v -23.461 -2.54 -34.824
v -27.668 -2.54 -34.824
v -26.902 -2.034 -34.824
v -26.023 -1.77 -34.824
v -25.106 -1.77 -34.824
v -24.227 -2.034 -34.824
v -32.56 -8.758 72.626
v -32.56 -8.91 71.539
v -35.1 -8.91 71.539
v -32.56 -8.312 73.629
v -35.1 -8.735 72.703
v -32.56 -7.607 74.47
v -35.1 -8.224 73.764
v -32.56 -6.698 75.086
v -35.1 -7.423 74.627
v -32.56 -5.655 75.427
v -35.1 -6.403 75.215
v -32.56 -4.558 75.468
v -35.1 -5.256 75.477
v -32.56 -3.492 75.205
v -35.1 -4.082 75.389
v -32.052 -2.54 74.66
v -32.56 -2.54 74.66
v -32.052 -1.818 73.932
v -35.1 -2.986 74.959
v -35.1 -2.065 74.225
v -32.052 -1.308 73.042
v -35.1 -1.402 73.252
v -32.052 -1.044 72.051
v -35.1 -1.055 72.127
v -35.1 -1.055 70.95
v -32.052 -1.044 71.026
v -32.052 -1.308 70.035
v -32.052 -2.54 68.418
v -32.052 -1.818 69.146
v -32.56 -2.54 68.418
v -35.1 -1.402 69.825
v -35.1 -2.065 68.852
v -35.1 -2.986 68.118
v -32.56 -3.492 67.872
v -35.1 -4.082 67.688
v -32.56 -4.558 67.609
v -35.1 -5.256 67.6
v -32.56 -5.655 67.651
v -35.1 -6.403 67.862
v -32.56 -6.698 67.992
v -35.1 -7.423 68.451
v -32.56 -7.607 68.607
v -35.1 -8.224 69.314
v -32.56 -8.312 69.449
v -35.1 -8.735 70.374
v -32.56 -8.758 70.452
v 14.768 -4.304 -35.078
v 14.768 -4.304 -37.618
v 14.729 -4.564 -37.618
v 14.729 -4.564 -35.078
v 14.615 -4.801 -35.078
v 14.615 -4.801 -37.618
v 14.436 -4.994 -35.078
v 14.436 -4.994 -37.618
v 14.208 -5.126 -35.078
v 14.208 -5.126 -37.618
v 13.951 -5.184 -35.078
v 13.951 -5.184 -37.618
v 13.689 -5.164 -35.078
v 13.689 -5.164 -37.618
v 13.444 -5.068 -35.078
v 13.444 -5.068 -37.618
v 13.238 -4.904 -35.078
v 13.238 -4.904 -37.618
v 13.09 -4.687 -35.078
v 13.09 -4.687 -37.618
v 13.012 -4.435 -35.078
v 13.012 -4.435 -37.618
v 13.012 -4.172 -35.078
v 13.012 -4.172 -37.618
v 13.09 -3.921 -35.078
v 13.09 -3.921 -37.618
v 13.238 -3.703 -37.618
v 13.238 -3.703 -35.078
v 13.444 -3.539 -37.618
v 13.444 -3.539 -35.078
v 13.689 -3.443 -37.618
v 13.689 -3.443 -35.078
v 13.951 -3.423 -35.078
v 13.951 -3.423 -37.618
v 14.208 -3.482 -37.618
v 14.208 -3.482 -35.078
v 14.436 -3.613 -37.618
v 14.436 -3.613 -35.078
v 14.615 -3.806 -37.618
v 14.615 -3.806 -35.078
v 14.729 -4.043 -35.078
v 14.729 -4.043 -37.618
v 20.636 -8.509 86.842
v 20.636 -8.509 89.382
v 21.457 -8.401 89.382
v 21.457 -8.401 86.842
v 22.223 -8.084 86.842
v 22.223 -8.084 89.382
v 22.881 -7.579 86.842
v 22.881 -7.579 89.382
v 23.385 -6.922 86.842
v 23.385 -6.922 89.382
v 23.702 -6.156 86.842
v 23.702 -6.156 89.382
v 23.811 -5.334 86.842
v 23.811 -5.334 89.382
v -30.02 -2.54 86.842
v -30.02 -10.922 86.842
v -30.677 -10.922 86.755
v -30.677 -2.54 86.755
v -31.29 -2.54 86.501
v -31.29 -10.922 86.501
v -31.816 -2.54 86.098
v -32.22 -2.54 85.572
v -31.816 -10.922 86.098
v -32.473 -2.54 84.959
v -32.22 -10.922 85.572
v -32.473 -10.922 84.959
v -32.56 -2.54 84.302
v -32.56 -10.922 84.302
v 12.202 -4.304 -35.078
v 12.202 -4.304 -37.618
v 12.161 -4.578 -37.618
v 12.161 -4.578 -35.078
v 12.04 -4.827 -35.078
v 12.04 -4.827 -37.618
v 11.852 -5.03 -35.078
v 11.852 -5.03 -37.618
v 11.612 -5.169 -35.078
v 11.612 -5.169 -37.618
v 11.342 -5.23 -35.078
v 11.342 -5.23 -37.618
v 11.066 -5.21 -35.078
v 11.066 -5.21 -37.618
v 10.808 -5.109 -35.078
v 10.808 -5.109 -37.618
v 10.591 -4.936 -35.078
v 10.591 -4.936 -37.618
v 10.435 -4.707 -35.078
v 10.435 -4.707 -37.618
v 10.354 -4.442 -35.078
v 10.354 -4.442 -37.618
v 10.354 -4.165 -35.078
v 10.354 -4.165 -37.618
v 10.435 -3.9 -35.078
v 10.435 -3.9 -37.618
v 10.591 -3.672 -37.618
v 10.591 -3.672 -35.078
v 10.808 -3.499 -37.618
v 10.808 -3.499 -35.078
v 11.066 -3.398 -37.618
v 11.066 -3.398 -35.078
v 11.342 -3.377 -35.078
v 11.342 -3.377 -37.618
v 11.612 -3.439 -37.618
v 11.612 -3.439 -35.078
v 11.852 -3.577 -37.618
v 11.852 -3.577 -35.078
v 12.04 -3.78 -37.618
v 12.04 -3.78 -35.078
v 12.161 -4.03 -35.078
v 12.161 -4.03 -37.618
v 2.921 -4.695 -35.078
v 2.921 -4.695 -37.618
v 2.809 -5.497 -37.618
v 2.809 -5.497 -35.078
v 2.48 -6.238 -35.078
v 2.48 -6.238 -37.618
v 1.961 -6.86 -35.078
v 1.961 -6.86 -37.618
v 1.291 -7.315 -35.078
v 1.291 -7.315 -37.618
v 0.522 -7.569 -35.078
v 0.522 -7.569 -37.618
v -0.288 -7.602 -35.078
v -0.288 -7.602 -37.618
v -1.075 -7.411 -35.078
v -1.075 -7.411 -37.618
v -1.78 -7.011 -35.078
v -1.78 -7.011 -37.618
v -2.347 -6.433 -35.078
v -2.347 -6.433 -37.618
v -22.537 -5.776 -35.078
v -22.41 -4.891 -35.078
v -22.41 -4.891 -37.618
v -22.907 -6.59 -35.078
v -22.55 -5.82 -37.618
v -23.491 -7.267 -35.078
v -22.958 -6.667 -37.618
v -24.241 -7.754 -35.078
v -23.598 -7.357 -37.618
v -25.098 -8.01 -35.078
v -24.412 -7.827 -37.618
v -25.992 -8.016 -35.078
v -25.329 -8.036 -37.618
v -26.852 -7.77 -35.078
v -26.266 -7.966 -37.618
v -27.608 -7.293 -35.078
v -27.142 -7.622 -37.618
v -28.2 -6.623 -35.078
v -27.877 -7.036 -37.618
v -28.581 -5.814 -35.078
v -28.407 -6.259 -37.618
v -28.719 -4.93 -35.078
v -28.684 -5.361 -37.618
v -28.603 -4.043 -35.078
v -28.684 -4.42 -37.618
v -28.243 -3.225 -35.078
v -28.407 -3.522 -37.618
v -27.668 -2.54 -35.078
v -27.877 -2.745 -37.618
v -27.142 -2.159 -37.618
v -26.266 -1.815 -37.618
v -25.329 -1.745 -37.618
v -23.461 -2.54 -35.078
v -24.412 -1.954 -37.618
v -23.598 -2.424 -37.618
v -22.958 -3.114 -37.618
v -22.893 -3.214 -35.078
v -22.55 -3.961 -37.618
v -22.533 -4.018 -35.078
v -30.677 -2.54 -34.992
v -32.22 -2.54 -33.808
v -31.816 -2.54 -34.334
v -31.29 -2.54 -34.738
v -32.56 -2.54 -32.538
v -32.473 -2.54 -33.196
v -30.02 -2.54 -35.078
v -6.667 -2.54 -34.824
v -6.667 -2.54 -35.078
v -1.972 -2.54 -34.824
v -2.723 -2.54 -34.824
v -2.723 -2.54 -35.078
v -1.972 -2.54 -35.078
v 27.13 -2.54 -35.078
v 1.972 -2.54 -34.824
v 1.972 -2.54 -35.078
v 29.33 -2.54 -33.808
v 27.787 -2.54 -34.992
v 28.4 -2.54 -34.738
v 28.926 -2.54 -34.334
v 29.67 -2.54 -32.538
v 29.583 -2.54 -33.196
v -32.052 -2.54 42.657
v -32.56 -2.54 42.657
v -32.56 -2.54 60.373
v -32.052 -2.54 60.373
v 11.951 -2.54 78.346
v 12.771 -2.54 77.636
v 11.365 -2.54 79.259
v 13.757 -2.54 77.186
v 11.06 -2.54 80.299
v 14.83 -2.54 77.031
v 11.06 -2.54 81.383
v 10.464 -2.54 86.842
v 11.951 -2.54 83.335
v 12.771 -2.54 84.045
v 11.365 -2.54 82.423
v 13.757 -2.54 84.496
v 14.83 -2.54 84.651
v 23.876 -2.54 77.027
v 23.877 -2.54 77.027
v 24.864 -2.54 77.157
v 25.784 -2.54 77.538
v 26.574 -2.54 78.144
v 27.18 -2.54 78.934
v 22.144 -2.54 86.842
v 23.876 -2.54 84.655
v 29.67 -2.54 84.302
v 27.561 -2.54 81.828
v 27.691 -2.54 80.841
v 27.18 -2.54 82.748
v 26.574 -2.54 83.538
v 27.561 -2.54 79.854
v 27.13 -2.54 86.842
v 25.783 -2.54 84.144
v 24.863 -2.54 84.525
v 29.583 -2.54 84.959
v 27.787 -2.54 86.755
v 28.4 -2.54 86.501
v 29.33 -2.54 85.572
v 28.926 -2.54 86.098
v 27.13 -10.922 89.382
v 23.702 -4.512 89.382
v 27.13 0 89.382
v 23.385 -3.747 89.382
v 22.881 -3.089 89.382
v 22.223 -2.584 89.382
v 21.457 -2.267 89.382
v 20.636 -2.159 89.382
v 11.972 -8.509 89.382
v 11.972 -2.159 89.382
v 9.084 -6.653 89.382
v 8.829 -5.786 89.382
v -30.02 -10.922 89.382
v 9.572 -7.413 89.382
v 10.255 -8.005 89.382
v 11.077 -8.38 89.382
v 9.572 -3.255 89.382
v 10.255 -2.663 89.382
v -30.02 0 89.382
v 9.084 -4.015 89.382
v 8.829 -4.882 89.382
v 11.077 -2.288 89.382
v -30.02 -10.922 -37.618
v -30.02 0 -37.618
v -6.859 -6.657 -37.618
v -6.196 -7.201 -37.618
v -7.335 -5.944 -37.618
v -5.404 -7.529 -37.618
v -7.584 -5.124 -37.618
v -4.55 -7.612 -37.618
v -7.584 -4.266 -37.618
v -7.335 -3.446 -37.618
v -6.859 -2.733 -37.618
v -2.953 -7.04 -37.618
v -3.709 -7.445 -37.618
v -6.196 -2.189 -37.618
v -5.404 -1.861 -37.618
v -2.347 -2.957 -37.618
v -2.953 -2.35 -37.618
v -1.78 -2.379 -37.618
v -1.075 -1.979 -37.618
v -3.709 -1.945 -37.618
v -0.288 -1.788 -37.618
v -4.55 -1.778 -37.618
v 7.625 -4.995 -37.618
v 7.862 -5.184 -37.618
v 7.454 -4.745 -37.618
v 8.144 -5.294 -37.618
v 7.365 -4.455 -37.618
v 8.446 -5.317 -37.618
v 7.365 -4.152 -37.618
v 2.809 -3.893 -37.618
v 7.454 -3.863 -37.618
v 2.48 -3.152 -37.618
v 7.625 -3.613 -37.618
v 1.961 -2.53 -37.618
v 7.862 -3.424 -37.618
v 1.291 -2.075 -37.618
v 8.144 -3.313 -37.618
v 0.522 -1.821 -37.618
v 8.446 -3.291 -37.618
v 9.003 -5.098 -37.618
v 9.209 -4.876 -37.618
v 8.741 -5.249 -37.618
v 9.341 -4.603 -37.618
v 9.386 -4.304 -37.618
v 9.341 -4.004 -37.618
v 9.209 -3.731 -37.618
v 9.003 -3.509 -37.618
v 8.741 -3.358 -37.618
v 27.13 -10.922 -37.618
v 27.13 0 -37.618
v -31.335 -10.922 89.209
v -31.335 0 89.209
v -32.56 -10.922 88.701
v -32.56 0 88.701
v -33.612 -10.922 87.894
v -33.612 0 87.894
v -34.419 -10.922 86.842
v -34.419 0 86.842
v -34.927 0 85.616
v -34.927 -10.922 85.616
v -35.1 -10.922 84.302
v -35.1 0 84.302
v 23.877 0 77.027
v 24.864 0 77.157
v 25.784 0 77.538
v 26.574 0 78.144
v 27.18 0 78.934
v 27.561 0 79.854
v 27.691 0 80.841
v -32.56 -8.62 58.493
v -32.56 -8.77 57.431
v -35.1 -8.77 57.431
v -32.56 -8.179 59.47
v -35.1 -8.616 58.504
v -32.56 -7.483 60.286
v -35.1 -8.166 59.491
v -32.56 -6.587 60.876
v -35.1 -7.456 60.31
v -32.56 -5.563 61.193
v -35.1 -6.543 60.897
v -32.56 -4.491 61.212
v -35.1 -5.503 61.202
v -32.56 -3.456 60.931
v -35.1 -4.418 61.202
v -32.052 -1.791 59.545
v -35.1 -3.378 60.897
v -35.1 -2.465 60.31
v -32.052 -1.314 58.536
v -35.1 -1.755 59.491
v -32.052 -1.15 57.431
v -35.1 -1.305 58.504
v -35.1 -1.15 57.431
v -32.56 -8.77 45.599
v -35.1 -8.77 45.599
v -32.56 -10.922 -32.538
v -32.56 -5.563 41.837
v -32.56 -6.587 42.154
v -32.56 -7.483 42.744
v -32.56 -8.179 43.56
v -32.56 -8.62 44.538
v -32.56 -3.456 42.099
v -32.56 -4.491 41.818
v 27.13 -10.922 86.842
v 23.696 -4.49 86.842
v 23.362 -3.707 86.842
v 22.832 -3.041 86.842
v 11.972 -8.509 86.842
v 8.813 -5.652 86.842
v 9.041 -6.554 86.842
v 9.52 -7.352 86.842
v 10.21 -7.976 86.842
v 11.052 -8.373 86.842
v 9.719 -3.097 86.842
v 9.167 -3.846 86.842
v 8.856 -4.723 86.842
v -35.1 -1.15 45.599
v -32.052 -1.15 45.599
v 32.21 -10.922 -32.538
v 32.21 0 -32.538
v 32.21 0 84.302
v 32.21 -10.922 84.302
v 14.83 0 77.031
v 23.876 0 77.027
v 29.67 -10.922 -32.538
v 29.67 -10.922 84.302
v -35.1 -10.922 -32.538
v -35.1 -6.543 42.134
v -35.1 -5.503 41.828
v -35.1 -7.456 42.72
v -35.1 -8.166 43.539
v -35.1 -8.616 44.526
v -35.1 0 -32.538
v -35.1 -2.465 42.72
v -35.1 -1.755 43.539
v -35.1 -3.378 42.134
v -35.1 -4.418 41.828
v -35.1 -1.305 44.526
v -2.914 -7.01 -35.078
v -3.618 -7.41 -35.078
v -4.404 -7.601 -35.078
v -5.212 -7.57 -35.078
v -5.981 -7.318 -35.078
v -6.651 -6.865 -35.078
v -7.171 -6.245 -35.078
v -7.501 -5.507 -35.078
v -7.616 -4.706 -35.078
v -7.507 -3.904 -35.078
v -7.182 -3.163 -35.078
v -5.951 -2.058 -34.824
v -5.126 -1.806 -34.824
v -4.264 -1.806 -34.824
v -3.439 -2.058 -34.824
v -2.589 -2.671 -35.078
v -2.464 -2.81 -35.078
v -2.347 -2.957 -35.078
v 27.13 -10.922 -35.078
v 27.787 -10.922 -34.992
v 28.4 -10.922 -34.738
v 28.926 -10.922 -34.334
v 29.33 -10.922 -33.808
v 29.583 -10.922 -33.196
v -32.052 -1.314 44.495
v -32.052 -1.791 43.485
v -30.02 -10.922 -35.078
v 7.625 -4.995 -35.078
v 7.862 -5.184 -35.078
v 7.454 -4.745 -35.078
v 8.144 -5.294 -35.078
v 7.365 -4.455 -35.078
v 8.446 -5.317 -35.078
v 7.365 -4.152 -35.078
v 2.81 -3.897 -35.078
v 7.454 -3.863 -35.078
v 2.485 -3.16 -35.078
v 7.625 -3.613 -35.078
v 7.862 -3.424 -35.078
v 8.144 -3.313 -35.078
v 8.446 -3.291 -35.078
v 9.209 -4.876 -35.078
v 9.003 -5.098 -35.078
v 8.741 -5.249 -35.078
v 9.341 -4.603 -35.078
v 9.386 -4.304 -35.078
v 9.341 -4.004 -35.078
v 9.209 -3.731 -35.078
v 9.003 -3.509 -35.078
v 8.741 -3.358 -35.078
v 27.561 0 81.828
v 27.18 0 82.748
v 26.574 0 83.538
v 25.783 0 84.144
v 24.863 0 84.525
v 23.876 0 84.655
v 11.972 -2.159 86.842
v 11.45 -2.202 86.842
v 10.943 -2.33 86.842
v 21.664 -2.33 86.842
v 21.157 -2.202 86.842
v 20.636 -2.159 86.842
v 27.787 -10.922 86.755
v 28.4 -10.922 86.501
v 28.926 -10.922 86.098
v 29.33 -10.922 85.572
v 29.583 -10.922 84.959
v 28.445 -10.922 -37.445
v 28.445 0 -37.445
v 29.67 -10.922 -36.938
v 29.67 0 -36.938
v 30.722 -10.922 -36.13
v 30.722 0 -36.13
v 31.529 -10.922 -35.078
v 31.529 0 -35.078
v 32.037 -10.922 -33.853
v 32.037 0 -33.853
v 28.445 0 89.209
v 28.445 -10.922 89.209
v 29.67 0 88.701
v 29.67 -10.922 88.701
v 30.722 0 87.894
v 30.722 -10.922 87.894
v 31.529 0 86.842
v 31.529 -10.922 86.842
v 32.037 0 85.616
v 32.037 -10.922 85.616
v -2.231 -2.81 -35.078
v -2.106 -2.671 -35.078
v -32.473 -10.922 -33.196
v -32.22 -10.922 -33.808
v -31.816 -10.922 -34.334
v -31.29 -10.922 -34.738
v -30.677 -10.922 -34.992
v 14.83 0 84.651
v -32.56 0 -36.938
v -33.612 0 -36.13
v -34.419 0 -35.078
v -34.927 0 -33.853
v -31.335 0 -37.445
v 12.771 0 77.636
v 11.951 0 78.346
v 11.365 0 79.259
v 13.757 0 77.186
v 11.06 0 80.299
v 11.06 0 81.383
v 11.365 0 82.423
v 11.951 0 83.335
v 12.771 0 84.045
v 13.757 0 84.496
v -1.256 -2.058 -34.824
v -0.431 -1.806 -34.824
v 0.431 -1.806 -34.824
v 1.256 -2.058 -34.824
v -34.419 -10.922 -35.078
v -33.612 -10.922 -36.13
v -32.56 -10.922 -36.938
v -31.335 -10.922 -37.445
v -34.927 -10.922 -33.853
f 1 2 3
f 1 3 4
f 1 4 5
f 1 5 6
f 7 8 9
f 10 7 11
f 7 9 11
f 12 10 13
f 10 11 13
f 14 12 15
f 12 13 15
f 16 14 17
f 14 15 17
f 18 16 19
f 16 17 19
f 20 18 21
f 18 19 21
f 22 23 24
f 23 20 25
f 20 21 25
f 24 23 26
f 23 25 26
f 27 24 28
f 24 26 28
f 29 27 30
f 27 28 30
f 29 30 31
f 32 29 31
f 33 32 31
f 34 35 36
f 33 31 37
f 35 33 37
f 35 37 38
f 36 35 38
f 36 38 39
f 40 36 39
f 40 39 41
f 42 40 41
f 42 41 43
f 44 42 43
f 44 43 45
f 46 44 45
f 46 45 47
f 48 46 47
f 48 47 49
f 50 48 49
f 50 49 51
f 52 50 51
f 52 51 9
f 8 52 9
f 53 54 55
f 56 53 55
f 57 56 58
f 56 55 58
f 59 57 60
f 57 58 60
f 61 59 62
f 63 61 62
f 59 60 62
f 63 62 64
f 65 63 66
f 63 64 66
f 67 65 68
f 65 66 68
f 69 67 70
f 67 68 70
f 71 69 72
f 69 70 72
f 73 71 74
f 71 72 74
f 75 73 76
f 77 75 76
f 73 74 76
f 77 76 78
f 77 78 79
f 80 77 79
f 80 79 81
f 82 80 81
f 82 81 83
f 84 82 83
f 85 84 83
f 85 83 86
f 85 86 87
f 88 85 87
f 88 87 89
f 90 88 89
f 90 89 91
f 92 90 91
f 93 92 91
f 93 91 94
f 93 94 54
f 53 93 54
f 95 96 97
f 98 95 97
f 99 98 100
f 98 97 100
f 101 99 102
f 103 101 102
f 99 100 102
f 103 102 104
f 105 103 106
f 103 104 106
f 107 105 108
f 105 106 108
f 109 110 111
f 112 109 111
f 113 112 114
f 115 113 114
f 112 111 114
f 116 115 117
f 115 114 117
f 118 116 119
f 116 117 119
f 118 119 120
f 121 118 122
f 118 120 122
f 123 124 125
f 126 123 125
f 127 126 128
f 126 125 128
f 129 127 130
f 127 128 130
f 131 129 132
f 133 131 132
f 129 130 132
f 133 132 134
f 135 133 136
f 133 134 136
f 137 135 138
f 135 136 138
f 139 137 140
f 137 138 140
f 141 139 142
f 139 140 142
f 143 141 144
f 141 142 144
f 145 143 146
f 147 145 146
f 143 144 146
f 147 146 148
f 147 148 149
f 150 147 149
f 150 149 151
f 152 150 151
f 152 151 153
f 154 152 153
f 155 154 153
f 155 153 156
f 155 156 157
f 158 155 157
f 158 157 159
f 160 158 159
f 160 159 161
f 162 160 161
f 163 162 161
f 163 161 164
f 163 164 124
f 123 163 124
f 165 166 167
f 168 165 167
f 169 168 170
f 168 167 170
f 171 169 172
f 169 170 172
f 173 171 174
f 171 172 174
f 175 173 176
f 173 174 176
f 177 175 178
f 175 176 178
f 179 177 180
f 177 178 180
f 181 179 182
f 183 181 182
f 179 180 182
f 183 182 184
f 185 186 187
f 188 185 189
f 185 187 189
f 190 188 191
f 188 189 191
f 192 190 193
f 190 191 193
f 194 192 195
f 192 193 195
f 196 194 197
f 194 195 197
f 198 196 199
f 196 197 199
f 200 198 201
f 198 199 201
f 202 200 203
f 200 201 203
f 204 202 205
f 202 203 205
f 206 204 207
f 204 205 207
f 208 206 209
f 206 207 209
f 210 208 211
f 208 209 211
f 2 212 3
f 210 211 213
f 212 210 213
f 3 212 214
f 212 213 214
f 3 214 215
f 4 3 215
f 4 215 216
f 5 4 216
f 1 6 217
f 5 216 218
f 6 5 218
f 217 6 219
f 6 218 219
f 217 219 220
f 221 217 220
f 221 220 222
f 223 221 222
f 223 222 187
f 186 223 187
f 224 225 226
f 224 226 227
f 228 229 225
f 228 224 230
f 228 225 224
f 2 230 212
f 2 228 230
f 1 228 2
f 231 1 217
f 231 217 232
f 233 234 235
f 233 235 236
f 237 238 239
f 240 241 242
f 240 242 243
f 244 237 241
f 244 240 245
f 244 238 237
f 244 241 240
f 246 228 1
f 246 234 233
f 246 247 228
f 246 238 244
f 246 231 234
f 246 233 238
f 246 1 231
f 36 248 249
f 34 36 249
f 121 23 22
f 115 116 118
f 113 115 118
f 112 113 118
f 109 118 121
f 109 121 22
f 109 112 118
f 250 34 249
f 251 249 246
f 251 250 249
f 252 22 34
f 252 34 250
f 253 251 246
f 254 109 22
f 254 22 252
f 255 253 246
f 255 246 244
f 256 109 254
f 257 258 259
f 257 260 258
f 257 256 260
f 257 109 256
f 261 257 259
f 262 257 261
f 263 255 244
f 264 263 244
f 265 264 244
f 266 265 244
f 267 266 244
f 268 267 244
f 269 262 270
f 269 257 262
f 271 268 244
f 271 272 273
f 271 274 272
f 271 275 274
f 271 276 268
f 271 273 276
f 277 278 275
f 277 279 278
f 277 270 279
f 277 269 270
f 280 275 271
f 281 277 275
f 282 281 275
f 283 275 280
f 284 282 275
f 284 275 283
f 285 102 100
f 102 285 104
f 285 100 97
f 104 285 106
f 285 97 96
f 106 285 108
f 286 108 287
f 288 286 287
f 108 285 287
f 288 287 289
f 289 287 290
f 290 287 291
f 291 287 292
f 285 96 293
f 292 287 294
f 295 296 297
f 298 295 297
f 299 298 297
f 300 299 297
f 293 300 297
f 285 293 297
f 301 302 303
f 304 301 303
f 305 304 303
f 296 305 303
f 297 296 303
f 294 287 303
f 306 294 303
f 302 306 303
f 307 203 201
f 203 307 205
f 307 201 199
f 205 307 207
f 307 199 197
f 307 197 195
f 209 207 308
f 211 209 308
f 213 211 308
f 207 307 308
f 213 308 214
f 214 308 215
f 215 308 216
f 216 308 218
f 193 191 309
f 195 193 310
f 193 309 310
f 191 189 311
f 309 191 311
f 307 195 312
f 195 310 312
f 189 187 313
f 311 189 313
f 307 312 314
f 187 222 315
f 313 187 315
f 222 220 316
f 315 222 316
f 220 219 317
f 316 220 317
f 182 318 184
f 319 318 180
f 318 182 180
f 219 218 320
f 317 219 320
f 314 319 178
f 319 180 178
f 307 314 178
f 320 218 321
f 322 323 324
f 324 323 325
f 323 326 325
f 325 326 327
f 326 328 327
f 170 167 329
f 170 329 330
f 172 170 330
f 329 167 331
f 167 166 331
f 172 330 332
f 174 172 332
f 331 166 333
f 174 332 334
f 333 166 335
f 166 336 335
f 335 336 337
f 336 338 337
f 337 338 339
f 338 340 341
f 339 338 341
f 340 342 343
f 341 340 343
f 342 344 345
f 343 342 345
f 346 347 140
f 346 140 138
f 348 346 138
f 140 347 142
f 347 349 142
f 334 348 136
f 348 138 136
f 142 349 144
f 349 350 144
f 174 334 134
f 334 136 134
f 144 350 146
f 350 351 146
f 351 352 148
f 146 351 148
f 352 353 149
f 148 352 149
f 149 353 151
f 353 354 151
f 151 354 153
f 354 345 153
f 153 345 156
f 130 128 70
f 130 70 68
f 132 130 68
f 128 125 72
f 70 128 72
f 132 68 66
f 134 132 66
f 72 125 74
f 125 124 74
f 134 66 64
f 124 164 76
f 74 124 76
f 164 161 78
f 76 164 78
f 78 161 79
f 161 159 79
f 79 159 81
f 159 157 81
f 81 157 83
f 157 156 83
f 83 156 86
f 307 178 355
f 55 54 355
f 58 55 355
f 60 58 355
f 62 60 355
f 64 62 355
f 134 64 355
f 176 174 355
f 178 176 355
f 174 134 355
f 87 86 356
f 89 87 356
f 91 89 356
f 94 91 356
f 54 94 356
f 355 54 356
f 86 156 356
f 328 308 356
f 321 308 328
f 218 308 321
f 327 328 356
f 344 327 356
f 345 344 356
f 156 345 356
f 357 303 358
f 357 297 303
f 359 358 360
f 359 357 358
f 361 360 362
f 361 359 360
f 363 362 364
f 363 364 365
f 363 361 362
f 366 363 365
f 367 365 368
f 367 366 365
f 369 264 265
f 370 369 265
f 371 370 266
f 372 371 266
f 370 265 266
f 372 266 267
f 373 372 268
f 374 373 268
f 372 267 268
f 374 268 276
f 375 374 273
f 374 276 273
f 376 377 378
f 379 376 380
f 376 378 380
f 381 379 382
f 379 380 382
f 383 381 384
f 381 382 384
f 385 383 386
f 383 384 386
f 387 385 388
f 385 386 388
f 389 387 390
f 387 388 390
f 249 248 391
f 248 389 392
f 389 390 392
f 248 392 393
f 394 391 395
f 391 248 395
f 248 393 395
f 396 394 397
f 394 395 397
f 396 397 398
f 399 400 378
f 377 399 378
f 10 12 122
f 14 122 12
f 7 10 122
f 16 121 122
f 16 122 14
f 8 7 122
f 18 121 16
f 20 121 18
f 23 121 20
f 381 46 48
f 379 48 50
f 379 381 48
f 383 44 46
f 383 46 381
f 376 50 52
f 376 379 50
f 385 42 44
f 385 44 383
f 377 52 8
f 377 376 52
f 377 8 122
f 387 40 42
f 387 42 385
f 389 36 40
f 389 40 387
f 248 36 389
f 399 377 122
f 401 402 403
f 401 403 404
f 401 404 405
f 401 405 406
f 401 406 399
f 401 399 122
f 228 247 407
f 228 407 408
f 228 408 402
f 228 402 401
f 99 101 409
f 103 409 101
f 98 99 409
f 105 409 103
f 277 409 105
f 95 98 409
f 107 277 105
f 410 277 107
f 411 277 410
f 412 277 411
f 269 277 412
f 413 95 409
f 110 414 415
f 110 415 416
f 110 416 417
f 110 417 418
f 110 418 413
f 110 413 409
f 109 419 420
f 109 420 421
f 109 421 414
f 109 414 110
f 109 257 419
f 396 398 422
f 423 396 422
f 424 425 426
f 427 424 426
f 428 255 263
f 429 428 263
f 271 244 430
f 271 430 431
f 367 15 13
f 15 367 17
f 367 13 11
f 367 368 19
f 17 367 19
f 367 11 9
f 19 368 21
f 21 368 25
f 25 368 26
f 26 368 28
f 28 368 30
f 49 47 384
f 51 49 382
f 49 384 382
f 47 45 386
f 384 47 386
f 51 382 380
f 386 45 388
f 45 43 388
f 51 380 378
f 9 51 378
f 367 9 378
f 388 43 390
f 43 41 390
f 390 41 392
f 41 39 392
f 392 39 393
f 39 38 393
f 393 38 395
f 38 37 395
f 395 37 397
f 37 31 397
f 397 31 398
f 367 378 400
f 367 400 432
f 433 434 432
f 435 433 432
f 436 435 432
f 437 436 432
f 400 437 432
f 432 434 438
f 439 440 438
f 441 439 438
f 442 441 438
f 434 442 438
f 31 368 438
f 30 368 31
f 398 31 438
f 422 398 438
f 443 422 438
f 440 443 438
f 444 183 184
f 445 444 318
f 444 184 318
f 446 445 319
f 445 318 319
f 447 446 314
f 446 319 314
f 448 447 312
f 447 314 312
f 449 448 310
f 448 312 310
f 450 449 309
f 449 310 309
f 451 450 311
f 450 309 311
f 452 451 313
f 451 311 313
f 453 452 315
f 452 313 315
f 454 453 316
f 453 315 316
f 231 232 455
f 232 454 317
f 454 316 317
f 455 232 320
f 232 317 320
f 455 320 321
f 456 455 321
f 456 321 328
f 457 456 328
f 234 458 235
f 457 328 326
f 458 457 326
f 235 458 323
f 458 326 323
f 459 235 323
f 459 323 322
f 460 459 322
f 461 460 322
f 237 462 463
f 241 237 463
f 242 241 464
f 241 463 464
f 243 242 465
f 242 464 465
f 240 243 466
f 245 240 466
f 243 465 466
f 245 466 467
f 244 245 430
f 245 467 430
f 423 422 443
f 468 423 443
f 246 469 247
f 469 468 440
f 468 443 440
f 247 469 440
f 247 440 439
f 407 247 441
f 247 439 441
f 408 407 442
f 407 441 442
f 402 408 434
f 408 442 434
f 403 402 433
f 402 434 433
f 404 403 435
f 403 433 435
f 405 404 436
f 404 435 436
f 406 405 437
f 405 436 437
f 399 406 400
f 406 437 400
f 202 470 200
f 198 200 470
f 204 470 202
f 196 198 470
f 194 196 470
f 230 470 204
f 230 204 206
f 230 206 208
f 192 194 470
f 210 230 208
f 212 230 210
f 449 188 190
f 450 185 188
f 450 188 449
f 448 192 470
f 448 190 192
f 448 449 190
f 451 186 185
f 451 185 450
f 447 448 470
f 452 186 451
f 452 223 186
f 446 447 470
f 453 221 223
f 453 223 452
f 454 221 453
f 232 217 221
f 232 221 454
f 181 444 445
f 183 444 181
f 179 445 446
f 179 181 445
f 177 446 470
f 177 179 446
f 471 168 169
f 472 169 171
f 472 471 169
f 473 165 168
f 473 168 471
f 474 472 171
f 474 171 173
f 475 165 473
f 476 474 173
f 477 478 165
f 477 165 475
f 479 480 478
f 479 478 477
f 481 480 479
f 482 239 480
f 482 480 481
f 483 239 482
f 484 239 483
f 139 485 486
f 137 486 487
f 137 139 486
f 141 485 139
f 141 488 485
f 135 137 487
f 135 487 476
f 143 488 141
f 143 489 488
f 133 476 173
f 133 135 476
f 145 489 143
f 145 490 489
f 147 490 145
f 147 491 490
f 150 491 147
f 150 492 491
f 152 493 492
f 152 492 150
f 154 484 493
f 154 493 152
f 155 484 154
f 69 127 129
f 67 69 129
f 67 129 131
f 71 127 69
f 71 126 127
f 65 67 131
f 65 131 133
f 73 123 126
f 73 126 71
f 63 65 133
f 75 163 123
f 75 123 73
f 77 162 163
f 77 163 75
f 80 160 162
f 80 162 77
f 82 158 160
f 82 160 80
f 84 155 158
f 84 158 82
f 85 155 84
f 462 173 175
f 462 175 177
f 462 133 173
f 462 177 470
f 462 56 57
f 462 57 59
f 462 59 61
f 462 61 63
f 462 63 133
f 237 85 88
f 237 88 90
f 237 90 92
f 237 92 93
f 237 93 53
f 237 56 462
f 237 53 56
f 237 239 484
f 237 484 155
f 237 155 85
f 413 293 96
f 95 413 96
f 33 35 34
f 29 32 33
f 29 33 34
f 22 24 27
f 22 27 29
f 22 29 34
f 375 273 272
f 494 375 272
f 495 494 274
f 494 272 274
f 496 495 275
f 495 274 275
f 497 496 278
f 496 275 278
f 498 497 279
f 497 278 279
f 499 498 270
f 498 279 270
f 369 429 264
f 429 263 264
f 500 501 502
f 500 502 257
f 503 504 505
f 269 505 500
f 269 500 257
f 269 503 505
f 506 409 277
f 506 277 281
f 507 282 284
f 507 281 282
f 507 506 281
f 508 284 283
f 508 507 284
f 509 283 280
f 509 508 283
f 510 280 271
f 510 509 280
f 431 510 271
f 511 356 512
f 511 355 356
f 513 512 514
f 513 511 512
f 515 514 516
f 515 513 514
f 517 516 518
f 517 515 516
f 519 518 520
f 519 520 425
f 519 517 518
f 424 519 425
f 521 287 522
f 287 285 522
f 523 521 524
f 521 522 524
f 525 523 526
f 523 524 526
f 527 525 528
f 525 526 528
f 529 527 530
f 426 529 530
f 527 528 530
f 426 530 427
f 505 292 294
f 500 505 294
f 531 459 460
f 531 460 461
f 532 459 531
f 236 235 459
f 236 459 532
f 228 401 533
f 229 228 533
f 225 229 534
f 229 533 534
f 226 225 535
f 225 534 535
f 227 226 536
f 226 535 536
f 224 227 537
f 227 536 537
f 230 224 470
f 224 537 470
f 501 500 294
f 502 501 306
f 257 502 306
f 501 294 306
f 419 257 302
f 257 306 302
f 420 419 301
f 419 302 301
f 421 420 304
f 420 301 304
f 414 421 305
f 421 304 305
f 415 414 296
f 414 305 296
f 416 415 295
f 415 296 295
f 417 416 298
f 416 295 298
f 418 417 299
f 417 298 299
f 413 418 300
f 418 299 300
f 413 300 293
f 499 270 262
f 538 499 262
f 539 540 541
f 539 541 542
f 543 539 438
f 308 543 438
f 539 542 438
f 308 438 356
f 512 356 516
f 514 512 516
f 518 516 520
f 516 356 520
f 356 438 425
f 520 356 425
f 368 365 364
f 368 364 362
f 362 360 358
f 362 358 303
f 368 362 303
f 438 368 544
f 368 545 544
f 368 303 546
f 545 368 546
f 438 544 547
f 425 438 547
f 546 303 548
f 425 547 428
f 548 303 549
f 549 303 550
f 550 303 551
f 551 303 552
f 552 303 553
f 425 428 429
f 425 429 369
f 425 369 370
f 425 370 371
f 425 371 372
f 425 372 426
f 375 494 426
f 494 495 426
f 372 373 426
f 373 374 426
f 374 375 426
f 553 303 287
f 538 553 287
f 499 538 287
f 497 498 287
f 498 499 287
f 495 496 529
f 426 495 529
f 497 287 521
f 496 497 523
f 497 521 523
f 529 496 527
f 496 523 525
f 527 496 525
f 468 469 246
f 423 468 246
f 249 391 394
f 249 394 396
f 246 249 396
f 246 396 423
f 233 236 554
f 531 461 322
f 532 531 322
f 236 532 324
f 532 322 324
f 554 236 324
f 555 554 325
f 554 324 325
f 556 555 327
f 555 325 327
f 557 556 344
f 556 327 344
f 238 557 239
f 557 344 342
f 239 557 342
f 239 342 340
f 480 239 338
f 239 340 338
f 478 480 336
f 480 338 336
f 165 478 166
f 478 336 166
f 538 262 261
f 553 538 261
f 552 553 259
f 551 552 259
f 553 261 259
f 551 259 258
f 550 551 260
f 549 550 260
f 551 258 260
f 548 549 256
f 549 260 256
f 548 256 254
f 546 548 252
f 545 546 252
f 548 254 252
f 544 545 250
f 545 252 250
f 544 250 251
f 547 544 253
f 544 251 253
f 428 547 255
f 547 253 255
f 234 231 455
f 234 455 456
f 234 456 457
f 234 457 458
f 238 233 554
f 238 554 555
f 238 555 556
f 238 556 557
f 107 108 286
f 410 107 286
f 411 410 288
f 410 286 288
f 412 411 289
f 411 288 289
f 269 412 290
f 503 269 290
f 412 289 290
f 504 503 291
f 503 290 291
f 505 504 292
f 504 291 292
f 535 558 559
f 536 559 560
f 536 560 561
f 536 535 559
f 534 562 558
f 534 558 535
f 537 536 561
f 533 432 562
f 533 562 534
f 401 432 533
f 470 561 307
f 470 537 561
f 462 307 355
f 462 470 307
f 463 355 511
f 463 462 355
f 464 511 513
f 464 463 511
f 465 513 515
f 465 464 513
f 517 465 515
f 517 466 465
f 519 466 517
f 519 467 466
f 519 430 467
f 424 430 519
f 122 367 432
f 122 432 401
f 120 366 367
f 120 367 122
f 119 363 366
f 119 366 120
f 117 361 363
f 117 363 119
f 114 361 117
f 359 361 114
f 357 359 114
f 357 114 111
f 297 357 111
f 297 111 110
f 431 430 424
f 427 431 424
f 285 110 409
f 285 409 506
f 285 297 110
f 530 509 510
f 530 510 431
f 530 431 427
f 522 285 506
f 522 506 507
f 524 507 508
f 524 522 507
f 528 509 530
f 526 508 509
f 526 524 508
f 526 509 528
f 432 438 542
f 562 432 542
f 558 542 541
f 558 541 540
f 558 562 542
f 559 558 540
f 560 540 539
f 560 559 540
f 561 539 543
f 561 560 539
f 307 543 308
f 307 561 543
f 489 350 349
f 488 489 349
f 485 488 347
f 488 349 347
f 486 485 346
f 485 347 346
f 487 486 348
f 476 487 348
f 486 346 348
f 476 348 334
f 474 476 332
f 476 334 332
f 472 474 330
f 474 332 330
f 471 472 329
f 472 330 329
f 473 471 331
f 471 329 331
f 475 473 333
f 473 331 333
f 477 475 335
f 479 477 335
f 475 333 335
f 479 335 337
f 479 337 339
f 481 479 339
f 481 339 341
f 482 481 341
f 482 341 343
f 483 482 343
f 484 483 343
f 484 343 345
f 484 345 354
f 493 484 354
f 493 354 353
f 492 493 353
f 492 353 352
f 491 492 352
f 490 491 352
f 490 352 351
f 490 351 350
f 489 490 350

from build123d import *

# Parameters (mm, degrees)
F1_DEPTH  = 10.922
F2_R      = 5.08
F3_T      = -2.54
F5_R      = 0.8828675693
F5_R_2    = 0.9293675191
F5_R_3    = 1.016
F5_R_4    = 3.1543371167
F6_DEPTH  = 2.794
F7_R      = 3.9497200101
F8_DEPTH  = 3.048
F10_DEPTH = 2.54
F11_DEPTH = 25.4
F12_DEPTH = 42.418
F13_DEPTH = 25.4
F14_DEPTH = 2.54


# Not quite as in the source:
# - ends of sketch curves that miss each other by under 0.0002 mm in the source are joined


with BuildPart() as f1:
    # F0 (on Front) → F1 (new body)
    with BuildSketch(Plane.XZ):
        Polygon((32.2100387361, 89.3816531977), (0, 89.3816531977), (-35.0999612639, 89.3816531977), (-35.0999612639, -37.6183468023), (32.2100387361, -37.6183468023), align=None)
    extrude(amount=F1_DEPTH)

    # F2
    f2_edges = [f1.edges().sort_by_distance(p)[0] for p in [
        (-35.099961, -5.461, 89.381653),
        (32.210039, -5.461, 89.381653),
        (32.210039, -5.461, -37.618347),
        (-35.099961, -5.461, -37.618347),
    ]]
    fillet(f2_edges, radius=F2_R)

    # F3
    f3_openings = [f1.faces().sort_by_distance(p)[0] for p in [
        (-1.444961, -10.922, 25.881653),
    ]]
    offset(amount=F3_T, openings=f3_openings)

    # F5 (on face) → F6 (cut)
    with BuildSketch(Plane(origin=(0, 0, -37.6183468023), x_dir=(1, 0, 0), z_dir=(0, 0, -1))):
        with Locations((13.885099197, 4.3037165888)):
            Circle(F5_R)
        with Locations((11.2725288543, 4.3037165888)):
            Circle(F5_R_2)
        with Locations((8.3696719582, 4.3037165888)):
            Circle(F5_R_3)
        with BuildLine():
            ThreePointArc((-2.3474816699, 2.9566967291), (-1.9210459872, 3.7797455945), (-1.7739633397, 4.6949633397))
            ThreePointArc((-1.7739633397, 4.6949633397), (-1.9210459872, 5.6101810849), (-2.3474816699, 6.4332299504))
            ThreePointArc((-2.3474816699, 6.4332299504), (-2.921, 4.6949633397), (-2.3474816699, 2.9566967291))
        make_face()
        with BuildLine():
            ThreePointArc((-2.3474816699, 6.4332299504), (-1.9210459872, 5.6101810849), (-1.7739633397, 4.6949633397))
            ThreePointArc((-1.7739633397, 4.6949633397), (-1.9210459872, 3.7797455945), (-2.3474816699, 2.9566967291))
            ThreePointArc((-2.3474816699, 2.9566967291), (0.9152177452, 1.9210459872), (2.921, 4.6949633397))
            ThreePointArc((2.921, 4.6949633397), (0.9152177452, 7.4688806923), (-2.3474816699, 6.4332299504))
        make_face()
        with BuildLine():
            ThreePointArc((-2.3474816699, 2.9566967291), (-2.921, 4.6949633397), (-2.3474816699, 6.4332299504))
            ThreePointArc((-2.3474816699, 6.4332299504), (-7.6159633397, 4.6949633397), (-2.3474816699, 2.9566967291))
        make_face()
        with Locations((-25.5645439029, 4.8905867152)):
            Circle(F5_R_4)
    extrude(amount=-F6_DEPTH, mode=Mode.SUBTRACT)

    # F7 (on face) → F8 (cut)
    with BuildSketch(Plane(origin=(-35.0999612639, 0, 0), x_dir=(0, -1, 0), z_dir=(-1, 0, 0))):
        with Locations((4.9604894593, 71.5386738494)):
            Circle(F7_R)
        with BuildLine():
            ThreePointArc((1.1504894593, 57.4310126755), (4.9604894593, 53.6210126755), (8.7704894593, 57.4310126755))
            ThreePointArc((8.7704894593, 57.4310126755), (4.9604894593, 61.2410126755), (1.1504894593, 57.4310126755))
        make_face()
        with BuildLine():
            Line((8.7704894593, 45.599225808), (8.7704894593, 57.4310126755))
            ThreePointArc((8.7704894593, 57.4310126755), (4.9604894593, 53.6210126755), (1.1504894593, 57.4310126755))
            Line((1.1504894593, 57.4310126755), (1.1504894593, 45.599225808))
            ThreePointArc((1.1504894593, 45.599225808), (4.9604894593, 49.409225808), (8.7704894593, 45.599225808))
        make_face()
        with BuildLine():
            ThreePointArc((1.1504894593, 45.599225808), (4.9604894593, 41.789225808), (8.7704894593, 45.599225808))
            ThreePointArc((8.7704894593, 45.599225808), (4.9604894593, 49.409225808), (1.1504894593, 45.599225808))
        make_face()
    extrude(amount=-F8_DEPTH, mode=Mode.SUBTRACT)

    # F9 (on face) → F10 (cut)
    with BuildSketch(Plane.XY.offset(89.3816531977)):
        with BuildLine():
            ThreePointArc((20.6356343466, -8.5090005688), (22.8806983769, -7.5790645991), (23.8106343466, -5.3340005688))
            ThreePointArc((23.8106343466, -5.3340005688), (22.8806983769, -3.0889365386), (20.6356343466, -2.1590005688))
            ThreePointArc((20.6356343466, -2.1590005688), (17.4606343466, -5.3340005688), (20.6356343466, -8.5090005688))
        make_face()
        with BuildLine():
            ThreePointArc((20.6356343466, -8.5090005688), (17.4606343466, -5.3340005688), (20.6356343466, -2.1590005688))
            Line((20.6356343466, -2.1590005688), (11.9718069021, -2.1590005688))
            ThreePointArc((11.9718069021, -2.1590005688), (14.2168709324, -3.0889365386), (15.1468069021, -5.3340005688))
            ThreePointArc((15.1468069021, -5.3340005688), (14.2168709324, -7.5790645991), (11.9718069021, -8.5090005688))
            Line((11.9718069021, -8.5090005688), (20.6356343466, -8.5090005688))
        make_face()
        with BuildLine():
            ThreePointArc((15.1468069021, -5.3340005688), (14.2168709324, -3.0889365386), (11.9718069021, -2.1590005688))
            ThreePointArc((11.9718069021, -2.1590005688), (8.7968069021, -5.3340005688), (11.9718069021, -8.5090005688))
            ThreePointArc((11.9718069021, -8.5090005688), (14.2168709324, -7.5790645991), (15.1468069021, -5.3340005688))
        make_face()
    extrude(amount=-F10_DEPTH, mode=Mode.SUBTRACT)

    # F4 (on face) → F11 (join)
    with BuildSketch(Plane.XZ.offset(2.54)):
        with BuildLine():
            ThreePointArc((14.8296833566, 77.0308773467), (17.524812874, 78.1462244598), (18.6413118633, 80.8408769987))
            ThreePointArc((18.6413118633, 80.8408769987), (17.524812874, 83.5355295376), (14.8296833566, 84.6508766507))
            ThreePointArc((14.8296833566, 84.6508766507), (11.0213118633, 80.8408769987), (14.8296833566, 77.0308773467))
        make_face()
        with BuildLine():
            ThreePointArc((23.875676609, 84.6547431762), (20.0634403296, 80.840061919), (23.8773067684, 77.0270104728))
            ThreePointArc((23.8773067684, 77.0270104728), (26.5741176514, 78.1440661157), (27.6911732943, 80.8408769987))
            ThreePointArc((27.6911732943, 80.8408769987), (26.5735412414, 83.5382641685), (23.875676609, 84.6547431762))
        make_face()
        with BuildLine():
            ThreePointArc((14.8296833566, 84.6508766507), (17.524812874, 83.5355295376), (18.6413118633, 80.8408769987))
            ThreePointArc((18.6413118633, 80.8408769987), (17.524812874, 78.1462244598), (14.8296833566, 77.0308773467))
            Line((14.8296833566, 77.0308773467), (23.8773067684, 77.0270101244))
            ThreePointArc((23.8773067684, 77.0270101244), (20.0634403296, 80.840061919), (23.875676609, 84.6547431762))
            Line((23.875676609, 84.6547431762), (14.8296833566, 84.6508766507))
        make_face()
    extrude(amount=F11_DEPTH)

    # F4 (on face) → F12 (cut)
    with BuildSketch(Plane.XZ.offset(2.54)):
        with BuildLine():
            ThreePointArc((14.8296833566, 77.0308773467), (17.524812874, 78.1462244598), (18.6413118633, 80.8408769987))
            ThreePointArc((18.6413118633, 80.8408769987), (17.524812874, 83.5355295376), (14.8296833566, 84.6508766507))
            ThreePointArc((14.8296833566, 84.6508766507), (11.0213118633, 80.8408769987), (14.8296833566, 77.0308773467))
        make_face()
        with BuildLine():
            ThreePointArc((23.875676609, 84.6547431762), (20.0634403296, 80.840061919), (23.8773067684, 77.0270104728))
            ThreePointArc((23.8773067684, 77.0270104728), (26.5741176514, 78.1440661157), (27.6911732943, 80.8408769987))
            ThreePointArc((27.6911732943, 80.8408769987), (26.5735412414, 83.5382641685), (23.875676609, 84.6547431762))
        make_face()
        with BuildLine():
            ThreePointArc((14.8296833566, 84.6508766507), (17.524812874, 83.5355295376), (18.6413118633, 80.8408769987))
            ThreePointArc((18.6413118633, 80.8408769987), (17.524812874, 78.1462244598), (14.8296833566, 77.0308773467))
            Line((14.8296833566, 77.0308773467), (23.8773067684, 77.0270101244))
            ThreePointArc((23.8773067684, 77.0270101244), (20.0634403296, 80.840061919), (23.875676609, 84.6547431762))
            Line((23.875676609, 84.6547431762), (14.8296833566, 84.6508766507))
        make_face()
    extrude(amount=F12_DEPTH, mode=Mode.SUBTRACT)

    # F4 (on face) → F13 (cut)
    with BuildSketch(Plane.XZ.offset(2.54)):
        with BuildLine():
            ThreePointArc((14.8296833566, 77.0308773467), (17.524812874, 78.1462244598), (18.6413118633, 80.8408769987))
            ThreePointArc((18.6413118633, 80.8408769987), (17.524812874, 83.5355295376), (14.8296833566, 84.6508766507))
            ThreePointArc((14.8296833566, 84.6508766507), (11.0213118633, 80.8408769987), (14.8296833566, 77.0308773467))
        make_face()
        with BuildLine():
            ThreePointArc((23.875676609, 84.6547431762), (20.0634403296, 80.840061919), (23.8773067684, 77.0270104728))
            ThreePointArc((23.8773067684, 77.0270104728), (26.5741176514, 78.1440661157), (27.6911732943, 80.8408769987))
            ThreePointArc((27.6911732943, 80.8408769987), (26.5735412414, 83.5382641685), (23.875676609, 84.6547431762))
        make_face()
        with BuildLine():
            ThreePointArc((14.8296833566, 84.6508766507), (17.524812874, 83.5355295376), (18.6413118633, 80.8408769987))
            ThreePointArc((18.6413118633, 80.8408769987), (17.524812874, 78.1462244598), (14.8296833566, 77.0308773467))
            Line((14.8296833566, 77.0308773467), (23.8773067684, 77.0270101244))
            ThreePointArc((23.8773067684, 77.0270101244), (20.0634403296, 80.840061919), (23.875676609, 84.6547431762))
            Line((23.875676609, 84.6547431762), (14.8296833566, 84.6508766507))
        make_face()
    extrude(amount=-F13_DEPTH, mode=Mode.SUBTRACT)

    # F9 (on face) → F14 (cut)
    with BuildSketch(Plane.XY.offset(89.3816531977)):
        with BuildLine():
            ThreePointArc((20.6356343466, -8.5090005688), (22.8806983769, -7.5790645991), (23.8106343466, -5.3340005688))
            ThreePointArc((23.8106343466, -5.3340005688), (22.8806983769, -3.0889365386), (20.6356343466, -2.1590005688))
            ThreePointArc((20.6356343466, -2.1590005688), (17.4606343466, -5.3340005688), (20.6356343466, -8.5090005688))
        make_face()
        with BuildLine():
            ThreePointArc((20.6356343466, -8.5090005688), (17.4606343466, -5.3340005688), (20.6356343466, -2.1590005688))
            Line((20.6356343466, -2.1590005688), (11.9718069021, -2.1590005688))
            ThreePointArc((11.9718069021, -2.1590005688), (14.2168709324, -3.0889365386), (15.1468069021, -5.3340005688))
            ThreePointArc((15.1468069021, -5.3340005688), (14.2168709324, -7.5790645991), (11.9718069021, -8.5090005688))
            Line((11.9718069021, -8.5090005688), (20.6356343466, -8.5090005688))
        make_face()
        with BuildLine():
            ThreePointArc((15.1468069021, -5.3340005688), (14.2168709324, -3.0889365386), (11.9718069021, -2.1590005688))
            ThreePointArc((11.9718069021, -2.1590005688), (8.7968069021, -5.3340005688), (11.9718069021, -8.5090005688))
            ThreePointArc((11.9718069021, -8.5090005688), (14.2168709324, -7.5790645991), (15.1468069021, -5.3340005688))
        make_face()
    extrude(amount=-F14_DEPTH, mode=Mode.SUBTRACT)


solid = f1.part
